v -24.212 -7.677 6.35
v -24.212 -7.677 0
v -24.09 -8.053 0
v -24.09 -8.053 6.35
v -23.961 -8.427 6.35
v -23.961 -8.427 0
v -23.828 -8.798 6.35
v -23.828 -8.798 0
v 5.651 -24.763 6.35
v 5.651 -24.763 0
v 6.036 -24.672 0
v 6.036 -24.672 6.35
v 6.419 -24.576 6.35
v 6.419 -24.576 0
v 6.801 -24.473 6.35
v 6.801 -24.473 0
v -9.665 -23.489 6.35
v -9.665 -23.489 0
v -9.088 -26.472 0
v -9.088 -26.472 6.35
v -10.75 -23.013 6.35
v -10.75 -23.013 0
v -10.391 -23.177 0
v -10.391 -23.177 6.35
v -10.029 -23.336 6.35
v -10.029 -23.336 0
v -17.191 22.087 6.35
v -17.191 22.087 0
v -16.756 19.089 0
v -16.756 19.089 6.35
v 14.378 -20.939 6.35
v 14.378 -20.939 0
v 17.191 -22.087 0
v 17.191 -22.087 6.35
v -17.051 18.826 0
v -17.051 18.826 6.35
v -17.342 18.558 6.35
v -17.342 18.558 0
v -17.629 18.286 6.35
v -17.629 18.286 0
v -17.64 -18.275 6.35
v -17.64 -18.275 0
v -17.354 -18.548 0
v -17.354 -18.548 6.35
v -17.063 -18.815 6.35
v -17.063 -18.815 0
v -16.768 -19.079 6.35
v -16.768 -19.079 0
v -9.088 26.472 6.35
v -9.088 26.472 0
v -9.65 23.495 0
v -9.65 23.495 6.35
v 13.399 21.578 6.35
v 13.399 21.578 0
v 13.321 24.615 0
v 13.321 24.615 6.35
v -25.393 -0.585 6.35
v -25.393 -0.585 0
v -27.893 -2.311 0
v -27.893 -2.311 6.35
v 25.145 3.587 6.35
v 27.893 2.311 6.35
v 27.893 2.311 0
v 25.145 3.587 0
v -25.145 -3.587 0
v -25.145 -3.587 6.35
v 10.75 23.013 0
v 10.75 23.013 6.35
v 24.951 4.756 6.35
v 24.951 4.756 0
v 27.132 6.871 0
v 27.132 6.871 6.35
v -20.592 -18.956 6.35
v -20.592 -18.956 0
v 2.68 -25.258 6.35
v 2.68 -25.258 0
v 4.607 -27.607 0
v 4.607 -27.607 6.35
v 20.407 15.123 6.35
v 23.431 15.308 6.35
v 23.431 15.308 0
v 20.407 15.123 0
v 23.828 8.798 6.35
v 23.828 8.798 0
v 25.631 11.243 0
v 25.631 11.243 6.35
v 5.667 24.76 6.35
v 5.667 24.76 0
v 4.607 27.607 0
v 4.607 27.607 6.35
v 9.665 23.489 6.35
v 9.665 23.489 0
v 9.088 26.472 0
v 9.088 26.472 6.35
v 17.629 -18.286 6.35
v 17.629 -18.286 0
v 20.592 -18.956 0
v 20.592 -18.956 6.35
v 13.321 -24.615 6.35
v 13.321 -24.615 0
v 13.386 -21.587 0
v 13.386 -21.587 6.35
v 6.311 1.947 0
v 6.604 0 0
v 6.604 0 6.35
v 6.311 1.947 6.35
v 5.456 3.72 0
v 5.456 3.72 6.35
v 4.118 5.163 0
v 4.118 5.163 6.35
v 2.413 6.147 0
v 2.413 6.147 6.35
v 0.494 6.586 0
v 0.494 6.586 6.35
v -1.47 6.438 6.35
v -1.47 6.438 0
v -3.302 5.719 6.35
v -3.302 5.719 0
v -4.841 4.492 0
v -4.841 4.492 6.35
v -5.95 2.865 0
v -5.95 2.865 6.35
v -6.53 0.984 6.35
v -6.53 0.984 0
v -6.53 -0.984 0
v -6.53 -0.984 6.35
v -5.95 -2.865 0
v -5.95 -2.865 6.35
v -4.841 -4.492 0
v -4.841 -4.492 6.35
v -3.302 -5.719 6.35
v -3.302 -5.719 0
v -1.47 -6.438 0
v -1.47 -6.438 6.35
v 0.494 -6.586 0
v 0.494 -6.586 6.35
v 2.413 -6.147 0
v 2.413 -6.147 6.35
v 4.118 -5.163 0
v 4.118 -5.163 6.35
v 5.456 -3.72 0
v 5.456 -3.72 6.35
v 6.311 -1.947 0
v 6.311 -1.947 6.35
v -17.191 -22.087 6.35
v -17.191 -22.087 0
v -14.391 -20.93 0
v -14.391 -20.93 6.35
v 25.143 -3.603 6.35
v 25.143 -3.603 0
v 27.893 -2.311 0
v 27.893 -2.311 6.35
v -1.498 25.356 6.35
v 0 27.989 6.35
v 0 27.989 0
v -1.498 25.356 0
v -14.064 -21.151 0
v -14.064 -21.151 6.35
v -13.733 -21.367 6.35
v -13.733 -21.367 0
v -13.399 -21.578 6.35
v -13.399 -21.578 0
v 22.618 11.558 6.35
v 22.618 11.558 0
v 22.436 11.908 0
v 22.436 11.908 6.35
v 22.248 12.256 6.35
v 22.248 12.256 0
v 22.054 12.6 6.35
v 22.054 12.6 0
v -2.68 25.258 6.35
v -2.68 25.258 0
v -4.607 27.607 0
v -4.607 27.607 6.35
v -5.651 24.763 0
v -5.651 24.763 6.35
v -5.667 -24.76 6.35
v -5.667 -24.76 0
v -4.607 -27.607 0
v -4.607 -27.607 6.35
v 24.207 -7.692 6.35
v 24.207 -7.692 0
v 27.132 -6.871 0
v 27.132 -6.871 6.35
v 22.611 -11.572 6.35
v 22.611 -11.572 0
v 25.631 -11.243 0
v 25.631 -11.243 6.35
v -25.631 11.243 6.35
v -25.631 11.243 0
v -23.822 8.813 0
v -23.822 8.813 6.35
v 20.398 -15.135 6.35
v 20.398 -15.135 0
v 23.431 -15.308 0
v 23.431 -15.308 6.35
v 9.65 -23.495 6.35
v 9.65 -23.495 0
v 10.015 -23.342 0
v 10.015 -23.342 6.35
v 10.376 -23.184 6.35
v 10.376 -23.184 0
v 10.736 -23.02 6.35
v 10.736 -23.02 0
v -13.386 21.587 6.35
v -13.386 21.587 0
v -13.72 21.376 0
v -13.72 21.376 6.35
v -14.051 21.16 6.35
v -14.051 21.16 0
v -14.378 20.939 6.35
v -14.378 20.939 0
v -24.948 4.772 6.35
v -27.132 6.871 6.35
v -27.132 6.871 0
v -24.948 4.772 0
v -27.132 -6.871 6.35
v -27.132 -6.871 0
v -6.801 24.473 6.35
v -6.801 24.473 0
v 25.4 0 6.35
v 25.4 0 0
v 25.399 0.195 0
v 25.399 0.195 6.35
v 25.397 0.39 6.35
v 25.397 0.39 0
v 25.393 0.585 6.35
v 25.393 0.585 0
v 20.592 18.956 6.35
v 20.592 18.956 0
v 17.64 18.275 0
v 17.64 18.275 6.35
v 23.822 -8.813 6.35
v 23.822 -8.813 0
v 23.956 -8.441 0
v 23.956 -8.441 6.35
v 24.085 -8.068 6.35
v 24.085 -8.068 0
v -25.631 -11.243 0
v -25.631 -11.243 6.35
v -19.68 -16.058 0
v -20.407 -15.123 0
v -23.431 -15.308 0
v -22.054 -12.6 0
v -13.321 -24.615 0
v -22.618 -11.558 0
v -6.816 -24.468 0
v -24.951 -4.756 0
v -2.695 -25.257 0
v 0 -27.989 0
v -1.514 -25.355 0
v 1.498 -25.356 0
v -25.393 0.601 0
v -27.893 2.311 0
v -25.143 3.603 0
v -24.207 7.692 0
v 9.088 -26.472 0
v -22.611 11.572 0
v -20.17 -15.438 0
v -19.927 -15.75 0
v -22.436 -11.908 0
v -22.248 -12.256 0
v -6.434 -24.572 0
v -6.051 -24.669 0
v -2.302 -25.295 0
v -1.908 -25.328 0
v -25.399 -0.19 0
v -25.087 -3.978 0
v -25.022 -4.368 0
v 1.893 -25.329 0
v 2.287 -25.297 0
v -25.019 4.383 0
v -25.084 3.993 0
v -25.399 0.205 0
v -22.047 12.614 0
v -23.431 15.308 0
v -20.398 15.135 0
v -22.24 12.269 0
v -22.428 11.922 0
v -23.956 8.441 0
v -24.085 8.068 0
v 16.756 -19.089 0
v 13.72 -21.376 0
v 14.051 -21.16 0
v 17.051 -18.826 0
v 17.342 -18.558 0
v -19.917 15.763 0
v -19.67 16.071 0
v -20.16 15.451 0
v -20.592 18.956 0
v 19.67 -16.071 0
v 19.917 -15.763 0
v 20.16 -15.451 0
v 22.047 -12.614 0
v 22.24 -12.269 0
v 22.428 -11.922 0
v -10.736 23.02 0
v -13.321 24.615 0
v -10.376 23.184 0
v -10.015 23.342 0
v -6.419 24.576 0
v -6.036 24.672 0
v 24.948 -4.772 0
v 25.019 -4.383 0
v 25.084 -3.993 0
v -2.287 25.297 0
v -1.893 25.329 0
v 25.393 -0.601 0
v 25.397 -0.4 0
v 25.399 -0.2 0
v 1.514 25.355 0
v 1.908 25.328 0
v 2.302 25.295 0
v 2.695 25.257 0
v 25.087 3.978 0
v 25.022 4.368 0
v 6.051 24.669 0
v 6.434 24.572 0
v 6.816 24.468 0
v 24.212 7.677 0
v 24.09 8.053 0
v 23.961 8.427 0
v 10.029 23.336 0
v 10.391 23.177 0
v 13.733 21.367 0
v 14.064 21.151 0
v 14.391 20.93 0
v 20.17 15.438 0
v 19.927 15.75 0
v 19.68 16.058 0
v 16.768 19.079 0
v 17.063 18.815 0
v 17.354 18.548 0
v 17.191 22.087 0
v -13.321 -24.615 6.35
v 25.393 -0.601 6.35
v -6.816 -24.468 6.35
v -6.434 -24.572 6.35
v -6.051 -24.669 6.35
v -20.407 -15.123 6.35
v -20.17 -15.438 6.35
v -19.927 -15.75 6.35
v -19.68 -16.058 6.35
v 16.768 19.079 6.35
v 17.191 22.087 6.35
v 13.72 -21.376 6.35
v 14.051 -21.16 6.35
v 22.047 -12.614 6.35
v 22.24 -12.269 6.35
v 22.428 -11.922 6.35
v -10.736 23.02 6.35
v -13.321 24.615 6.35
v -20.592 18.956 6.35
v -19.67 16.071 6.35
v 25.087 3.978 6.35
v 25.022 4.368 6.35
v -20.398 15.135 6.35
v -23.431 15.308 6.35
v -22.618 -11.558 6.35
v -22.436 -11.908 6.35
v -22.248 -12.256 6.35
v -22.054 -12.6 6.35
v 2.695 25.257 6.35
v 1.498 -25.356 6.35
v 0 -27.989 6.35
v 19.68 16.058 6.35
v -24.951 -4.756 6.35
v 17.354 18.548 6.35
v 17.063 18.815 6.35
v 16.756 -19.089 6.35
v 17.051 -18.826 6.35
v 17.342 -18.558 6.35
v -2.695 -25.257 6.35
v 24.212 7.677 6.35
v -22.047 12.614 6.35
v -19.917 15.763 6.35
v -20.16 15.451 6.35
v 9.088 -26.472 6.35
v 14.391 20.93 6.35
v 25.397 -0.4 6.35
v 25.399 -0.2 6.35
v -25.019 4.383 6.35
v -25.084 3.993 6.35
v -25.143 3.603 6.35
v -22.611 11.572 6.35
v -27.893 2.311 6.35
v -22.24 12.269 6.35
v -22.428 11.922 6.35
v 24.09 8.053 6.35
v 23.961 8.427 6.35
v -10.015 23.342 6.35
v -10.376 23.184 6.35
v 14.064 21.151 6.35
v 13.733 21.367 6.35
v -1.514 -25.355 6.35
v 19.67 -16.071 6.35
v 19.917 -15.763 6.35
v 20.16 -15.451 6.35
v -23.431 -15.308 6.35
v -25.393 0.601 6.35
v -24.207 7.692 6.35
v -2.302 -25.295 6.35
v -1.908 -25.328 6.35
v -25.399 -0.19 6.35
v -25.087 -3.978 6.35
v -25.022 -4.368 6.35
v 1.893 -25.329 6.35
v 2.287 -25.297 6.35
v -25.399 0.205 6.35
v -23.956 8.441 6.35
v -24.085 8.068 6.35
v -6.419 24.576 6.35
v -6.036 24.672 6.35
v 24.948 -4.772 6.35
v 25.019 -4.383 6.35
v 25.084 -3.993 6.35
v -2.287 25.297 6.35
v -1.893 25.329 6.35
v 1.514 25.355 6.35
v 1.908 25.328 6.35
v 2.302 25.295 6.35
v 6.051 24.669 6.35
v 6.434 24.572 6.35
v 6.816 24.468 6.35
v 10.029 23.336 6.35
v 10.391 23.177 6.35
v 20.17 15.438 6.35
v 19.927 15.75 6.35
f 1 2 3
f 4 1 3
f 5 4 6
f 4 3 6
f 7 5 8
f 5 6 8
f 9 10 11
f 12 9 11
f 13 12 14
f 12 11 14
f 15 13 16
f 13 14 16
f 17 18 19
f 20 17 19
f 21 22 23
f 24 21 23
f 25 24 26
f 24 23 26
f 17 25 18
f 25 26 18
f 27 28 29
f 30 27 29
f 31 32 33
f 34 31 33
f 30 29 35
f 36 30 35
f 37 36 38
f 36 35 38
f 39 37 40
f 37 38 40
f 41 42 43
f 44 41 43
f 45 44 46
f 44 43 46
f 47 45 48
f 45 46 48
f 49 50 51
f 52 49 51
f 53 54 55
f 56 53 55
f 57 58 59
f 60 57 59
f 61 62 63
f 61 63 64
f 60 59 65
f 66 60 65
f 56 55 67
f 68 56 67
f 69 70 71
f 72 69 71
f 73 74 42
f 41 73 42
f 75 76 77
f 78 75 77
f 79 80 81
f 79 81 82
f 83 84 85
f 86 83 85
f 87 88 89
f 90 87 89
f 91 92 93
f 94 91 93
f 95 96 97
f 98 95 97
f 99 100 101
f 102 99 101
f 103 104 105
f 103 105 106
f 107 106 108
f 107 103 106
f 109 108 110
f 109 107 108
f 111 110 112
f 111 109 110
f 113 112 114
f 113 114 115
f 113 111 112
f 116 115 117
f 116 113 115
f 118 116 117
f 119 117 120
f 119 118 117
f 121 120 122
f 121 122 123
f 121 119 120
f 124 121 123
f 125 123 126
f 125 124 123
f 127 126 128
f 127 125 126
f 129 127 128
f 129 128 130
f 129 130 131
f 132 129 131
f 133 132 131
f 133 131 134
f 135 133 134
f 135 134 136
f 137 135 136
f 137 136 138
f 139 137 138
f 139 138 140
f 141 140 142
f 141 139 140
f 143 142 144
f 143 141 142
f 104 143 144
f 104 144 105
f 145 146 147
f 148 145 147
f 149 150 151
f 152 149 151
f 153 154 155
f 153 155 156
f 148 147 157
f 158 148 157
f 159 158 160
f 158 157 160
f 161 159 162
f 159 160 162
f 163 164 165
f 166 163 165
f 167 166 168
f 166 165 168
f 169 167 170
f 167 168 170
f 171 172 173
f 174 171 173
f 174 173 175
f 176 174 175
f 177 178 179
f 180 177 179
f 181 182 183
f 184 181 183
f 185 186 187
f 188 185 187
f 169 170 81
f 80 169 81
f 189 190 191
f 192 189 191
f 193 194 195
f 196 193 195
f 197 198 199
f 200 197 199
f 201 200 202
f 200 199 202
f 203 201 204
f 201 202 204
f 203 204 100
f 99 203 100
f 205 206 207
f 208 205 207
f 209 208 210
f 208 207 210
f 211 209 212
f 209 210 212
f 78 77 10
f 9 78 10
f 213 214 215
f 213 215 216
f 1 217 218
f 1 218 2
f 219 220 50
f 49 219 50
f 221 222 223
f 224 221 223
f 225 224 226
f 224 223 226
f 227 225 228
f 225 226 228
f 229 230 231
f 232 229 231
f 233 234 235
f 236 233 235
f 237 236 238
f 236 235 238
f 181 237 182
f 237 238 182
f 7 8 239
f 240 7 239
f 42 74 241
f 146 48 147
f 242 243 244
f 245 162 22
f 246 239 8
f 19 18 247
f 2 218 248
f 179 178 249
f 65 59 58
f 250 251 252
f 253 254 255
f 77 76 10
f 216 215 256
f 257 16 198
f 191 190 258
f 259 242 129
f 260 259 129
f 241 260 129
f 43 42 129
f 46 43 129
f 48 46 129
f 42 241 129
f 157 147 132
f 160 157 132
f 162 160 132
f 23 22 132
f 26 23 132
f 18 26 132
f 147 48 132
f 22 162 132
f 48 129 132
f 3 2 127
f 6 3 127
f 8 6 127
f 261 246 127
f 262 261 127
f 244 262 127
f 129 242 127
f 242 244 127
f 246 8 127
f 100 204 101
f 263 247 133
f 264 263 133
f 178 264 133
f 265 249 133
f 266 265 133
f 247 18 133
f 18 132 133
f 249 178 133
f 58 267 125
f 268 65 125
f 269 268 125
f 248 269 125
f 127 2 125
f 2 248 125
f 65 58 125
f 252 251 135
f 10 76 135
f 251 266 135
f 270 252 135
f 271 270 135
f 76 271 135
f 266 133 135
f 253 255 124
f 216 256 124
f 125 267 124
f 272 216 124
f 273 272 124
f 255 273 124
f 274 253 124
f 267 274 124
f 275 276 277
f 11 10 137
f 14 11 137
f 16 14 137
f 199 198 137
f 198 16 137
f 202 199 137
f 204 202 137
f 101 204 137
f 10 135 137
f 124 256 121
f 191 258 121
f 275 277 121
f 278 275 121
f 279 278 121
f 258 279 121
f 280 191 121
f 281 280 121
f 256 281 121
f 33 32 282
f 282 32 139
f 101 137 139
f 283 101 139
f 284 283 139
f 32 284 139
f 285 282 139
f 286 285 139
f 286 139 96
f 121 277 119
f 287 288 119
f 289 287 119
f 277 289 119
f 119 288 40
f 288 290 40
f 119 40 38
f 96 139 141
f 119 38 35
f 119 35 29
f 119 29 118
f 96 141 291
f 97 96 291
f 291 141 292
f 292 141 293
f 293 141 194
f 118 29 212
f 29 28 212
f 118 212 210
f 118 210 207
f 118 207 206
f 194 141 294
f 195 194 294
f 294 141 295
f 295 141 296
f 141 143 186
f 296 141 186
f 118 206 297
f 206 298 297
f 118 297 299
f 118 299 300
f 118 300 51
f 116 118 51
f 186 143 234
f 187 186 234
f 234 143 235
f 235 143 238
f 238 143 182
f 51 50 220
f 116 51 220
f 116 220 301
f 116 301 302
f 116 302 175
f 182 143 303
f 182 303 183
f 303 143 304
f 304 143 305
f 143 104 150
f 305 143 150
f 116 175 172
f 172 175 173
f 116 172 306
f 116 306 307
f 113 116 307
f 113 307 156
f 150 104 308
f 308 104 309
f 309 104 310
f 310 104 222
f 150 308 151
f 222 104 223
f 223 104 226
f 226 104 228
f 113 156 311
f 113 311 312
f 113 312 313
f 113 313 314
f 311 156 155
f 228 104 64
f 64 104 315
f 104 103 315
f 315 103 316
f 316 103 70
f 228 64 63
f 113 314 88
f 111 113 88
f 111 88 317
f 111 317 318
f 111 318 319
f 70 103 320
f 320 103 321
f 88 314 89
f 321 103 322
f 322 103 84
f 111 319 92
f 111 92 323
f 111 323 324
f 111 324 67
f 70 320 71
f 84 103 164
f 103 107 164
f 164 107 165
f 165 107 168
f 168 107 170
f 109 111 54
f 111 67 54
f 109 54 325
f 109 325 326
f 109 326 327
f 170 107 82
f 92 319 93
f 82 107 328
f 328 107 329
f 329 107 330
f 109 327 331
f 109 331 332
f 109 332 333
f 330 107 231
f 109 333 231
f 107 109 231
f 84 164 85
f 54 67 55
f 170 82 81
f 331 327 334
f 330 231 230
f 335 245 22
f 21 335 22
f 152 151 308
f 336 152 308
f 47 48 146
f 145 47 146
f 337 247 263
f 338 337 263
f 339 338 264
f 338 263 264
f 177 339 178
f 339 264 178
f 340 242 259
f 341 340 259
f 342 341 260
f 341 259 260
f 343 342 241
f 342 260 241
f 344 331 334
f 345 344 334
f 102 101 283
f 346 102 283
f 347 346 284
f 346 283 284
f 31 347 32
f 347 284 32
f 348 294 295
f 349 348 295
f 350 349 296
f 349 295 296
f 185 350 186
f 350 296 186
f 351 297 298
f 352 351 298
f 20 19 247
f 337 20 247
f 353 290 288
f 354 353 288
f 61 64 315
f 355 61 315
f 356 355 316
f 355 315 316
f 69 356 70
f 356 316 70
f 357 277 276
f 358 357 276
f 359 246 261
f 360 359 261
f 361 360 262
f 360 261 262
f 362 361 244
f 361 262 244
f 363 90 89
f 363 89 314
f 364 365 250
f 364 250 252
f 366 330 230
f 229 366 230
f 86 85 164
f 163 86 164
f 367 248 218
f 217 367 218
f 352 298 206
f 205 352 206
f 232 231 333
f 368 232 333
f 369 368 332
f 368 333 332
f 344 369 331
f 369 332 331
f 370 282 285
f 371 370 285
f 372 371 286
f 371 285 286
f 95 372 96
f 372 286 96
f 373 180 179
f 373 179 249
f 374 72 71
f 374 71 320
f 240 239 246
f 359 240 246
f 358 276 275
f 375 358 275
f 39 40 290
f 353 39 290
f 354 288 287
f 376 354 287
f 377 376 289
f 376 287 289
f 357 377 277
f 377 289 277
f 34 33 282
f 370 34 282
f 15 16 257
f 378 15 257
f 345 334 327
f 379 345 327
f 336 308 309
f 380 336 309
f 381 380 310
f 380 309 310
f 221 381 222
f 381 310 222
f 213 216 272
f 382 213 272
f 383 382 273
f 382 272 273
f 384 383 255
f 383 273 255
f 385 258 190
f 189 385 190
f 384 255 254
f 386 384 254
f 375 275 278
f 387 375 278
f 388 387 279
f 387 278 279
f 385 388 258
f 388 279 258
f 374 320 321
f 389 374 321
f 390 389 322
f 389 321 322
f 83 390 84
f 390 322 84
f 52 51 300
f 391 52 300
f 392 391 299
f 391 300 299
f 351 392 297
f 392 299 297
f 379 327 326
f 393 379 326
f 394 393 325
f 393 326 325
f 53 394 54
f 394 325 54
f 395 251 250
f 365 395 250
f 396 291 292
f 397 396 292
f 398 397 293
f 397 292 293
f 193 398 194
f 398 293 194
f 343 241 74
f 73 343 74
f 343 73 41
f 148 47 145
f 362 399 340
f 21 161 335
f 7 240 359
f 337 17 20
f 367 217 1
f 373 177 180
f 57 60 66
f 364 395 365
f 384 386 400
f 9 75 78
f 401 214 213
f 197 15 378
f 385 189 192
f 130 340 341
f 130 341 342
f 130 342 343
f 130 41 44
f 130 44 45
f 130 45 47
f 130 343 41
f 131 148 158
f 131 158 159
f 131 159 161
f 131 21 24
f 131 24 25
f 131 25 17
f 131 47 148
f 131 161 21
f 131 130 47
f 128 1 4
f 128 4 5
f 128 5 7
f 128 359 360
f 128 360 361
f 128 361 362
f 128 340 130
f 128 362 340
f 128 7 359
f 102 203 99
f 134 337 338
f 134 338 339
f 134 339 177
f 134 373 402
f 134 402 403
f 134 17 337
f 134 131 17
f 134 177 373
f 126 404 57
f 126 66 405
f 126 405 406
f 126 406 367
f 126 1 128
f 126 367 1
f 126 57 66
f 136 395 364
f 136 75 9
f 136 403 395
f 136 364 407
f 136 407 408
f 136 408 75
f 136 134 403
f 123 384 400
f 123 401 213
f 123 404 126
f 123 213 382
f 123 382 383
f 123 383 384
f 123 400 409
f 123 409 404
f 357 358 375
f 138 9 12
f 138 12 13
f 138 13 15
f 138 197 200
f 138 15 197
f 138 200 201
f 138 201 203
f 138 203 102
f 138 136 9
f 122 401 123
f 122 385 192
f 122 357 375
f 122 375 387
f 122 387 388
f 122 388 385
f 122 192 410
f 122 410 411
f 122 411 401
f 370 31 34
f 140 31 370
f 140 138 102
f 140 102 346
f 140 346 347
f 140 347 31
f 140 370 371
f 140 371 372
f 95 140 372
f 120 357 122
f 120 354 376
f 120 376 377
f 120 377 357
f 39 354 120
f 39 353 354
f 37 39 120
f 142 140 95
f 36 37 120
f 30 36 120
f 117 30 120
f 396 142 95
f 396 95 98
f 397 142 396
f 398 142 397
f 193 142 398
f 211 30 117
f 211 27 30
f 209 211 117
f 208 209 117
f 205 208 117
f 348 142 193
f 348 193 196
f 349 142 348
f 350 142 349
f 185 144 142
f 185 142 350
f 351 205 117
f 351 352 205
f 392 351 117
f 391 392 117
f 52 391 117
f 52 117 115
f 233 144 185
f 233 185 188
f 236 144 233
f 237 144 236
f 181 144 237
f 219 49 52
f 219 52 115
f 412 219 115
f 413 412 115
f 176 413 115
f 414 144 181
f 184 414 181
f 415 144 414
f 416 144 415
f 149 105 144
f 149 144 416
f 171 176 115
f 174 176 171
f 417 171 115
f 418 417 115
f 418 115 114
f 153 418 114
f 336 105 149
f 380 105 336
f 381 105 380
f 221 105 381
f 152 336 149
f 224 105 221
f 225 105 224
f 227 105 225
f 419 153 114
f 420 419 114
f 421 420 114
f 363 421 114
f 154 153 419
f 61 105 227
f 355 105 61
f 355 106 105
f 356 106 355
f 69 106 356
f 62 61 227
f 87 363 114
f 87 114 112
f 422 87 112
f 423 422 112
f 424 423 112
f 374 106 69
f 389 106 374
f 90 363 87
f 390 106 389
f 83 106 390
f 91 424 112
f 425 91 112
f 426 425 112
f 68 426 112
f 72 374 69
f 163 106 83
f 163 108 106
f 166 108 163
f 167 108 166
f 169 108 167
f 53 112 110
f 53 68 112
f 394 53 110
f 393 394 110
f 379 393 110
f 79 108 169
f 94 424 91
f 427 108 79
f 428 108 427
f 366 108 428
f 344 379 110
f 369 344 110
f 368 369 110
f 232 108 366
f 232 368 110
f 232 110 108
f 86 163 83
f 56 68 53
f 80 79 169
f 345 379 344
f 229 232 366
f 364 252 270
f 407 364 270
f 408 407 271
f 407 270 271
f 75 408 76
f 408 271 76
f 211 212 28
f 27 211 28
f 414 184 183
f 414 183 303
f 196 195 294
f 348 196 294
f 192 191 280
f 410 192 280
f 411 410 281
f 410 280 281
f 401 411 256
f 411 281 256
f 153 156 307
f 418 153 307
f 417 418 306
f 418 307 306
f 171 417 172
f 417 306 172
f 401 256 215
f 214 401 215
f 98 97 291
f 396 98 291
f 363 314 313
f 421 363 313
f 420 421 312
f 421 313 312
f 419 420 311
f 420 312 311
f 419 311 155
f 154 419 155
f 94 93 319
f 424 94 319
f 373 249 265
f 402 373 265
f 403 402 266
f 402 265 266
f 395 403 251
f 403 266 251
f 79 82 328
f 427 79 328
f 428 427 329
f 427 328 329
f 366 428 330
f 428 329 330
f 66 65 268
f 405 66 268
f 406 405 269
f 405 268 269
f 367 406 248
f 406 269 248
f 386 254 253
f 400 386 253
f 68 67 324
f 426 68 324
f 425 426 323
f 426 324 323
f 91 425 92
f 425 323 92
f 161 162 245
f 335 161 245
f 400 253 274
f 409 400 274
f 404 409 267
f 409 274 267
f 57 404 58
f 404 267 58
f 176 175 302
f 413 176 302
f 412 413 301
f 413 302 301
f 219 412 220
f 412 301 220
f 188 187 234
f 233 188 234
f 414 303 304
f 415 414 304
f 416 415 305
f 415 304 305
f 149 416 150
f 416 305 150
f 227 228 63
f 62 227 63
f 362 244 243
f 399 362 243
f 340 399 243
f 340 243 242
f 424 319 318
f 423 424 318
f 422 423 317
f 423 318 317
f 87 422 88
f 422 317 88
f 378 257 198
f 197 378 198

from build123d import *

# Parameters (mm, degrees)
F0_R     = 6.604
F1_DEPTH = 6.35


with BuildPart() as f1:
    # F0 (on Top) → F1 (new body)
    with BuildSketch(Plane.XY):
        with BuildLine():
            ThreePointArc((25.392899, -0.600559), (25.398225, -0.3003), (25.4, 0))
            ThreePointArc((25.4, 0), (25.398317, 0.29242), (25.393267, 0.5848))
            ThreePointArc((25.393267, 0.5848), (25.313896, 2.089661), (25.145422, 3.587166))
            ThreePointArc((25.145422, 3.587166), (25.054873, 4.172929), (24.950681, 4.756419))
            ThreePointArc((24.950681, 4.756419), (24.6247, 6.227691), (24.212043, 7.677042))
            ThreePointArc((24.212043, 7.677042), (24.026316, 8.239912), (23.827505, 8.798295))
            ThreePointArc((23.827505, 8.798295), (23.263807, 10.195846), (22.618223, 11.557509))
            ThreePointArc((22.618223, 11.557509), (22.342383, 12.082132), (22.054378, 12.600176))
            ThreePointArc((22.054378, 12.600176), (21.268338, 13.885885), (20.407436, 15.122716))
            ThreePointArc((20.407436, 15.122716), (20.049009, 15.594783), (19.679664, 16.058357))
            ThreePointArc((19.679664, 16.058357), (18.692724, 17.197153), (17.639988, 18.275416))
            ThreePointArc((17.639988, 18.275416), (17.20875, 18.682049), (16.76814, 19.078508))
            ThreePointArc((16.76814, 19.078508), (15.607222, 20.039327), (14.391367, 20.92961))
            ThreePointArc((14.391367, 20.92961), (13.899081, 21.259717), (13.399225, 21.578247))
            ThreePointArc((13.399225, 21.578247), (12.095995, 22.334881), (10.750187, 23.012898))
            ThreePointArc((10.750187, 23.012898), (10.210281, 23.257475), (9.664815, 23.489388))
            ThreePointArc((9.664815, 23.489388), (8.25482, 24.021198), (6.81577, 24.468455))
            ThreePointArc((6.81577, 24.468455), (6.242971, 24.620831), (5.666773, 24.7598))
            ThreePointArc((5.666773, 24.7598), (4.188476, 25.052279), (2.695436, 25.256576))
            ThreePointArc((2.695436, 25.256576), (2.10537, 25.312594), (1.514156, 25.354829))
            ThreePointArc((1.514156, 25.354829), (0.757415, 25.388705), (0, 25.4))
            ThreePointArc((0, 25.4), (-0.749537, 25.388938), (-1.498422, 25.355763))
            ThreePointArc((-1.498422, 25.355763), (-2.089661, 25.313896), (-2.679762, 25.258244))
            ThreePointArc((-2.679762, 25.258244), (-4.172929, 25.054873), (-5.651406, 24.763312))
            ThreePointArc((-5.651406, 24.763312), (-6.227691, 24.6247), (-6.800584, 24.47268))
            ThreePointArc((-6.800584, 24.47268), (-8.239912, 24.026316), (-9.650236, 23.495381))
            ThreePointArc((-9.650236, 23.495381), (-10.195846, 23.263807), (-10.735904, 23.019565))
            ThreePointArc((-10.735904, 23.019565), (-12.082132, 22.342383), (-13.385832, 21.586558))
            ThreePointArc((-13.385832, 21.586558), (-13.885885, 21.268338), (-14.378376, 20.938536))
            ThreePointArc((-14.378376, 20.938536), (-15.594783, 20.049009), (-16.756297, 19.08891))
            ThreePointArc((-16.756297, 19.08891), (-17.197153, 18.692724), (-17.628643, 18.286359))
            ThreePointArc((-17.628643, 18.286359), (-18.682049, 17.20875), (-19.669695, 16.070567))
            ThreePointArc((-19.669695, 16.070567), (-20.039327, 15.607222), (-20.398047, 15.135378))
            ThreePointArc((-20.398047, 15.135378), (-21.259717, 13.899081), (-22.046554, 12.61386))
            ThreePointArc((-22.046554, 12.61386), (-22.334881, 12.095995), (-22.611046, 11.571543))
            ThreePointArc((-22.611046, 11.571543), (-23.257475, 10.210281), (-23.822041, 8.81308))
            ThreePointArc((-23.822041, 8.81308), (-24.021198, 8.25482), (-24.207274, 7.692066))
            ThreePointArc((-24.207274, 7.692066), (-24.620831, 6.242971), (-24.947724, 4.771902))
            ThreePointArc((-24.947724, 4.771902), (-25.052279, 4.188476), (-25.143191, 3.60277))
            ThreePointArc((-25.143191, 3.60277), (-25.312594, 2.10537), (-25.392899, 0.600559))
            ThreePointArc((-25.392899, 0.600559), (-25.399999, 0.007881), (-25.393267, -0.5848))
            ThreePointArc((-25.393267, -0.5848), (-25.313896, -2.089661), (-25.145422, -3.587166))
            ThreePointArc((-25.145422, -3.587166), (-25.054873, -4.172929), (-24.950681, -4.756419))
            ThreePointArc((-24.950681, -4.756419), (-24.6247, -6.227691), (-24.212043, -7.677042))
            ThreePointArc((-24.212043, -7.677042), (-24.026316, -8.239912), (-23.827505, -8.798295))
            ThreePointArc((-23.827505, -8.798295), (-23.263807, -10.195846), (-22.618223, -11.557509))
            ThreePointArc((-22.618223, -11.557509), (-22.342383, -12.082132), (-22.054378, -12.600176))
            ThreePointArc((-22.054378, -12.600176), (-21.268338, -13.885885), (-20.407436, -15.122716))
            ThreePointArc((-20.407436, -15.122716), (-20.049009, -15.594783), (-19.679664, -16.058357))
            ThreePointArc((-19.679664, -16.058357), (-18.692724, -17.197153), (-17.639988, -18.275416))
            ThreePointArc((-17.639988, -18.275416), (-17.20875, -18.682049), (-16.76814, -19.078508))
            ThreePointArc((-16.76814, -19.078508), (-15.607222, -20.039327), (-14.391367, -20.92961))
            ThreePointArc((-14.391367, -20.92961), (-13.899081, -21.259717), (-13.399225, -21.578247))
            ThreePointArc((-13.399225, -21.578247), (-12.095995, -22.334881), (-10.750187, -23.012898))
            ThreePointArc((-10.750187, -23.012898), (-10.210281, -23.257475), (-9.664815, -23.489388))
            ThreePointArc((-9.664815, -23.489388), (-8.25482, -24.021198), (-6.81577, -24.468455))
            ThreePointArc((-6.81577, -24.468455), (-6.242971, -24.620831), (-5.666773, -24.7598))
            ThreePointArc((-5.666773, -24.7598), (-4.188476, -25.052279), (-2.695436, -25.256576))
            ThreePointArc((-2.695436, -25.256576), (-2.10537, -25.312594), (-1.514156, -25.354829))
            ThreePointArc((-1.514156, -25.354829), (-0.007881, -25.399999), (1.498422, -25.355763))
            ThreePointArc((1.498422, -25.355763), (2.089661, -25.313896), (2.679762, -25.258244))
            ThreePointArc((2.679762, -25.258244), (4.172929, -25.054873), (5.651406, -24.763312))
            ThreePointArc((5.651406, -24.763312), (6.227691, -24.6247), (6.800584, -24.47268))
            ThreePointArc((6.800584, -24.47268), (8.239912, -24.026316), (9.650236, -23.495381))
            ThreePointArc((9.650236, -23.495381), (10.195846, -23.263807), (10.735904, -23.019565))
            ThreePointArc((10.735904, -23.019565), (12.082132, -22.342383), (13.385832, -21.586558))
            ThreePointArc((13.385832, -21.586558), (13.885885, -21.268338), (14.378376, -20.938536))
            ThreePointArc((14.378376, -20.938536), (15.594783, -20.049009), (16.756297, -19.08891))
            ThreePointArc((16.756297, -19.08891), (17.197153, -18.692724), (17.628643, -18.286359))
            ThreePointArc((17.628643, -18.286359), (18.682049, -17.20875), (19.669695, -16.070567))
            ThreePointArc((19.669695, -16.070567), (20.039327, -15.607222), (20.398047, -15.135378))
            ThreePointArc((20.398047, -15.135378), (21.259717, -13.899081), (22.046554, -12.61386))
            ThreePointArc((22.046554, -12.61386), (22.334881, -12.095995), (22.611046, -11.571543))
            ThreePointArc((22.611046, -11.571543), (23.257475, -10.210281), (23.822041, -8.81308))
            ThreePointArc((23.822041, -8.81308), (24.021198, -8.25482), (24.207274, -7.692066))
            ThreePointArc((24.207274, -7.692066), (24.620831, -6.242971), (24.947724, -4.771902))
            ThreePointArc((24.947724, -4.771902), (25.052279, -4.188476), (25.143191, -3.60277))
            ThreePointArc((25.143191, -3.60277), (25.312594, -2.10537), (25.392899, -0.600559))
        make_face()
        Circle(F0_R, mode=Mode.SUBTRACT)
        with BuildLine():
            ThreePointArc((25.145422, 3.587166), (25.313896, 2.089661), (25.393267, 0.5848))
            Line((25.393267, 0.5848), (27.893054, 2.311284))
            Line((27.893054, 2.311284), (25.145422, 3.587166))
        make_face()
        with BuildLine():
            Line((27.893054, -2.311284), (25.392899, -0.600559))
            ThreePointArc((25.392899, -0.600559), (25.312594, -2.10537), (25.143191, -3.60277))
            Line((25.143191, -3.60277), (27.893054, -2.311284))
        make_face()
        with BuildLine():
            ThreePointArc((24.212043, 7.677042), (24.6247, 6.227691), (24.950681, 4.756419))
            Line((24.950681, 4.756419), (27.132205, 6.870807))
            Line((27.132205, 6.870807), (24.212043, 7.677042))
        make_face()
        with BuildLine():
            Line((27.132205, -6.870807), (24.947724, -4.771902))
            ThreePointArc((24.947724, -4.771902), (24.620831, -6.242971), (24.207274, -7.692066))
            Line((24.207274, -7.692066), (27.132205, -6.870807))
        make_face()
        with BuildLine():
            ThreePointArc((22.618223, 11.557509), (23.263807, 10.195846), (23.827505, 8.798295))
            Line((23.827505, 8.798295), (25.631259, 11.242913))
            Line((25.631259, 11.242913), (22.618223, 11.557509))
        make_face()
        with BuildLine():
            Line((25.631259, -11.242913), (23.822041, -8.81308))
            ThreePointArc((23.822041, -8.81308), (23.257475, -10.210281), (22.611046, -11.571543))
            Line((22.611046, -11.571543), (25.631259, -11.242913))
        make_face()
        with BuildLine():
            ThreePointArc((20.407436, 15.122716), (21.268338, 13.885885), (22.054378, 12.600176))
            Line((22.054378, 12.600176), (23.431159, 15.308341))
            Line((23.431159, 15.308341), (20.407436, 15.122716))
        make_face()
        with BuildLine():
            Line((23.431159, -15.308341), (22.046554, -12.61386))
            ThreePointArc((22.046554, -12.61386), (21.259717, -13.899081), (20.398047, -15.135378))
            Line((20.398047, -15.135378), (23.431159, -15.308341))
        make_face()
        with BuildLine():
            ThreePointArc((17.639988, 18.275416), (18.692724, 17.197153), (19.679664, 16.058357))
            Line((19.679664, 16.058357), (20.591919, 18.956197))
            Line((20.591919, 18.956197), (17.639988, 18.275416))
        make_face()
        with BuildLine():
            Line((20.591919, -18.956197), (19.669695, -16.070567))
            ThreePointArc((19.669695, -16.070567), (18.682049, -17.20875), (17.628643, -18.286359))
            Line((17.628643, -18.286359), (20.591919, -18.956197))
        make_face()
        with BuildLine():
            ThreePointArc((14.391367, 20.92961), (15.607222, 20.039327), (16.76814, 19.078508))
            Line((16.76814, 19.078508), (17.190985, 22.086977))
            Line((17.190985, 22.086977), (14.391367, 20.92961))
        make_face()
        with BuildLine():
            Line((17.190985, -22.086977), (16.756297, -19.08891))
            ThreePointArc((16.756297, -19.08891), (15.594783, -20.049009), (14.378376, -20.938536))
            Line((14.378376, -20.938536), (17.190985, -22.086977))
        make_face()
        with BuildLine():
            ThreePointArc((10.750187, 23.012898), (12.095995, 22.334881), (13.399225, 21.578247))
            Line((13.399225, 21.578247), (13.321125, 24.615283))
            Line((13.321125, 24.615283), (10.750187, 23.012898))
        make_face()
        with BuildLine():
            Line((13.321125, -24.615283), (13.385832, -21.586558))
            ThreePointArc((13.385832, -21.586558), (12.082132, -22.342383), (10.735904, -23.019565))
            Line((10.735904, -23.019565), (13.321125, -24.615283))
        make_face()
        with BuildLine():
            ThreePointArc((6.81577, 24.468455), (8.25482, 24.021198), (9.664815, 23.489388))
            Line((9.664815, 23.489388), (9.0879, 26.472148))
            Line((9.0879, 26.472148), (6.81577, 24.468455))
        make_face()
        with BuildLine():
            Line((9.0879, -26.472148), (9.650236, -23.495381))
            ThreePointArc((9.650236, -23.495381), (8.239912, -24.026316), (6.800584, -24.47268))
            Line((6.800584, -24.47268), (9.0879, -26.472148))
        make_face()
        with BuildLine():
            ThreePointArc((2.695436, 25.256576), (4.188476, 25.052279), (5.666773, 24.7598))
            Line((5.666773, 24.7598), (4.60678, 27.606921))
            Line((4.60678, 27.606921), (2.695436, 25.256576))
        make_face()
        with BuildLine():
            Line((4.60678, -27.606921), (5.651406, -24.763312))
            ThreePointArc((5.651406, -24.763312), (4.172929, -25.054873), (2.679762, -25.258244))
            Line((2.679762, -25.258244), (4.60678, -27.606921))
        make_face()
        with BuildLine():
            ThreePointArc((0, 25.4), (0.757415, 25.388705), (1.514156, 25.354829))
            Line((1.514156, 25.354829), (0, 27.98865))
            Line((0, 27.98865), (0, 25.4))
        make_face()
        with BuildLine():
            Line((0, -27.98865), (1.498422, -25.355763))
            ThreePointArc((1.498422, -25.355763), (-0.007881, -25.399999), (-1.514156, -25.354829))
            Line((-1.514156, -25.354829), (0, -27.98865))
        make_face()
        with BuildLine():
            ThreePointArc((-1.498422, 25.355763), (-0.749537, 25.388938), (0, 25.4))
            Line((0, 25.4), (0, 27.98865))
            Line((0, 27.98865), (-1.498422, 25.355763))
        make_face()
        with BuildLine():
            Line((-4.60678, -27.606921), (-2.695436, -25.256576))
            ThreePointArc((-2.695436, -25.256576), (-4.188476, -25.052279), (-5.666773, -24.7598))
            Line((-5.666773, -24.7598), (-4.60678, -27.606921))
        make_face()
        with BuildLine():
            ThreePointArc((-5.651406, 24.763312), (-4.172929, 25.054873), (-2.679762, 25.258244))
            Line((-2.679762, 25.258244), (-4.60678, 27.606921))
            Line((-4.60678, 27.606921), (-5.651406, 24.763312))
        make_face()
        with BuildLine():
            Line((-9.0879, -26.472148), (-6.81577, -24.468455))
            ThreePointArc((-6.81577, -24.468455), (-8.25482, -24.021198), (-9.664815, -23.489388))
            Line((-9.664815, -23.489388), (-9.0879, -26.472148))
        make_face()
        with BuildLine():
            ThreePointArc((-9.650236, 23.495381), (-8.239912, 24.026316), (-6.800584, 24.47268))
            Line((-6.800584, 24.47268), (-9.0879, 26.472148))
            Line((-9.0879, 26.472148), (-9.650236, 23.495381))
        make_face()
        with BuildLine():
            Line((-13.321125, -24.615283), (-10.750187, -23.012898))
            ThreePointArc((-10.750187, -23.012898), (-12.095995, -22.334881), (-13.399225, -21.578247))
            Line((-13.399225, -21.578247), (-13.321125, -24.615283))
        make_face()
        with BuildLine():
            ThreePointArc((-13.385832, 21.586558), (-12.082132, 22.342383), (-10.735904, 23.019565))
            Line((-10.735904, 23.019565), (-13.321125, 24.615283))
            Line((-13.321125, 24.615283), (-13.385832, 21.586558))
        make_face()
        with BuildLine():
            Line((-17.190985, -22.086977), (-14.391367, -20.92961))
            ThreePointArc((-14.391367, -20.92961), (-15.607222, -20.039327), (-16.76814, -19.078508))
            Line((-16.76814, -19.078508), (-17.190985, -22.086977))
        make_face()
        with BuildLine():
            ThreePointArc((-16.756297, 19.08891), (-15.594783, 20.049009), (-14.378376, 20.938536))
            Line((-14.378376, 20.938536), (-17.190985, 22.086977))
            Line((-17.190985, 22.086977), (-16.756297, 19.08891))
        make_face()
        with BuildLine():
            Line((-20.591919, -18.956197), (-17.639988, -18.275416))
            ThreePointArc((-17.639988, -18.275416), (-18.692724, -17.197153), (-19.679664, -16.058357))
            Line((-19.679664, -16.058357), (-20.591919, -18.956197))
        make_face()
        with BuildLine():
            ThreePointArc((-19.669695, 16.070567), (-18.682049, 17.20875), (-17.628643, 18.286359))
            Line((-17.628643, 18.286359), (-20.591919, 18.956197))
            Line((-20.591919, 18.956197), (-19.669695, 16.070567))
        make_face()
        with BuildLine():
            Line((-23.431159, -15.308341), (-20.407436, -15.122716))
            ThreePointArc((-20.407436, -15.122716), (-21.268338, -13.885885), (-22.054378, -12.600176))
            Line((-22.054378, -12.600176), (-23.431159, -15.308341))
        make_face()
        with BuildLine():
            ThreePointArc((-22.046554, 12.61386), (-21.259717, 13.899081), (-20.398047, 15.135378))
            Line((-20.398047, 15.135378), (-23.431159, 15.308341))
            Line((-23.431159, 15.308341), (-22.046554, 12.61386))
        make_face()
        with BuildLine():
            Line((-25.631259, -11.242913), (-22.618223, -11.557509))
            ThreePointArc((-22.618223, -11.557509), (-23.263807, -10.195846), (-23.827505, -8.798295))
            Line((-23.827505, -8.798295), (-25.631259, -11.242913))
        make_face()
        with BuildLine():
            ThreePointArc((-23.822041, 8.81308), (-23.257475, 10.210281), (-22.611046, 11.571543))
            Line((-22.611046, 11.571543), (-25.631259, 11.242913))
            Line((-25.631259, 11.242913), (-23.822041, 8.81308))
        make_face()
        with BuildLine():
            Line((-27.132205, -6.870807), (-24.212043, -7.677042))
            ThreePointArc((-24.212043, -7.677042), (-24.6247, -6.227691), (-24.950681, -4.756419))
            Line((-24.950681, -4.756419), (-27.132205, -6.870807))
        make_face()
        with BuildLine():
            ThreePointArc((-24.947724, 4.771902), (-24.620831, 6.242971), (-24.207274, 7.692066))
            Line((-24.207274, 7.692066), (-27.132205, 6.870807))
            Line((-27.132205, 6.870807), (-24.947724, 4.771902))
        make_face()
        with BuildLine():
            Line((-27.893054, -2.311284), (-25.145422, -3.587166))
            ThreePointArc((-25.145422, -3.587166), (-25.313896, -2.089661), (-25.393267, -0.5848))
            Line((-25.393267, -0.5848), (-27.893054, -2.311284))
        make_face()
        with BuildLine():
            ThreePointArc((-25.392899, 0.600559), (-25.312594, 2.10537), (-25.143191, 3.60277))
            Line((-25.143191, 3.60277), (-27.893054, 2.311284))
            Line((-27.893054, 2.311284), (-25.392899, 0.600559))
        make_face()
    extrude(amount=F1_DEPTH)


solid = f1.part
